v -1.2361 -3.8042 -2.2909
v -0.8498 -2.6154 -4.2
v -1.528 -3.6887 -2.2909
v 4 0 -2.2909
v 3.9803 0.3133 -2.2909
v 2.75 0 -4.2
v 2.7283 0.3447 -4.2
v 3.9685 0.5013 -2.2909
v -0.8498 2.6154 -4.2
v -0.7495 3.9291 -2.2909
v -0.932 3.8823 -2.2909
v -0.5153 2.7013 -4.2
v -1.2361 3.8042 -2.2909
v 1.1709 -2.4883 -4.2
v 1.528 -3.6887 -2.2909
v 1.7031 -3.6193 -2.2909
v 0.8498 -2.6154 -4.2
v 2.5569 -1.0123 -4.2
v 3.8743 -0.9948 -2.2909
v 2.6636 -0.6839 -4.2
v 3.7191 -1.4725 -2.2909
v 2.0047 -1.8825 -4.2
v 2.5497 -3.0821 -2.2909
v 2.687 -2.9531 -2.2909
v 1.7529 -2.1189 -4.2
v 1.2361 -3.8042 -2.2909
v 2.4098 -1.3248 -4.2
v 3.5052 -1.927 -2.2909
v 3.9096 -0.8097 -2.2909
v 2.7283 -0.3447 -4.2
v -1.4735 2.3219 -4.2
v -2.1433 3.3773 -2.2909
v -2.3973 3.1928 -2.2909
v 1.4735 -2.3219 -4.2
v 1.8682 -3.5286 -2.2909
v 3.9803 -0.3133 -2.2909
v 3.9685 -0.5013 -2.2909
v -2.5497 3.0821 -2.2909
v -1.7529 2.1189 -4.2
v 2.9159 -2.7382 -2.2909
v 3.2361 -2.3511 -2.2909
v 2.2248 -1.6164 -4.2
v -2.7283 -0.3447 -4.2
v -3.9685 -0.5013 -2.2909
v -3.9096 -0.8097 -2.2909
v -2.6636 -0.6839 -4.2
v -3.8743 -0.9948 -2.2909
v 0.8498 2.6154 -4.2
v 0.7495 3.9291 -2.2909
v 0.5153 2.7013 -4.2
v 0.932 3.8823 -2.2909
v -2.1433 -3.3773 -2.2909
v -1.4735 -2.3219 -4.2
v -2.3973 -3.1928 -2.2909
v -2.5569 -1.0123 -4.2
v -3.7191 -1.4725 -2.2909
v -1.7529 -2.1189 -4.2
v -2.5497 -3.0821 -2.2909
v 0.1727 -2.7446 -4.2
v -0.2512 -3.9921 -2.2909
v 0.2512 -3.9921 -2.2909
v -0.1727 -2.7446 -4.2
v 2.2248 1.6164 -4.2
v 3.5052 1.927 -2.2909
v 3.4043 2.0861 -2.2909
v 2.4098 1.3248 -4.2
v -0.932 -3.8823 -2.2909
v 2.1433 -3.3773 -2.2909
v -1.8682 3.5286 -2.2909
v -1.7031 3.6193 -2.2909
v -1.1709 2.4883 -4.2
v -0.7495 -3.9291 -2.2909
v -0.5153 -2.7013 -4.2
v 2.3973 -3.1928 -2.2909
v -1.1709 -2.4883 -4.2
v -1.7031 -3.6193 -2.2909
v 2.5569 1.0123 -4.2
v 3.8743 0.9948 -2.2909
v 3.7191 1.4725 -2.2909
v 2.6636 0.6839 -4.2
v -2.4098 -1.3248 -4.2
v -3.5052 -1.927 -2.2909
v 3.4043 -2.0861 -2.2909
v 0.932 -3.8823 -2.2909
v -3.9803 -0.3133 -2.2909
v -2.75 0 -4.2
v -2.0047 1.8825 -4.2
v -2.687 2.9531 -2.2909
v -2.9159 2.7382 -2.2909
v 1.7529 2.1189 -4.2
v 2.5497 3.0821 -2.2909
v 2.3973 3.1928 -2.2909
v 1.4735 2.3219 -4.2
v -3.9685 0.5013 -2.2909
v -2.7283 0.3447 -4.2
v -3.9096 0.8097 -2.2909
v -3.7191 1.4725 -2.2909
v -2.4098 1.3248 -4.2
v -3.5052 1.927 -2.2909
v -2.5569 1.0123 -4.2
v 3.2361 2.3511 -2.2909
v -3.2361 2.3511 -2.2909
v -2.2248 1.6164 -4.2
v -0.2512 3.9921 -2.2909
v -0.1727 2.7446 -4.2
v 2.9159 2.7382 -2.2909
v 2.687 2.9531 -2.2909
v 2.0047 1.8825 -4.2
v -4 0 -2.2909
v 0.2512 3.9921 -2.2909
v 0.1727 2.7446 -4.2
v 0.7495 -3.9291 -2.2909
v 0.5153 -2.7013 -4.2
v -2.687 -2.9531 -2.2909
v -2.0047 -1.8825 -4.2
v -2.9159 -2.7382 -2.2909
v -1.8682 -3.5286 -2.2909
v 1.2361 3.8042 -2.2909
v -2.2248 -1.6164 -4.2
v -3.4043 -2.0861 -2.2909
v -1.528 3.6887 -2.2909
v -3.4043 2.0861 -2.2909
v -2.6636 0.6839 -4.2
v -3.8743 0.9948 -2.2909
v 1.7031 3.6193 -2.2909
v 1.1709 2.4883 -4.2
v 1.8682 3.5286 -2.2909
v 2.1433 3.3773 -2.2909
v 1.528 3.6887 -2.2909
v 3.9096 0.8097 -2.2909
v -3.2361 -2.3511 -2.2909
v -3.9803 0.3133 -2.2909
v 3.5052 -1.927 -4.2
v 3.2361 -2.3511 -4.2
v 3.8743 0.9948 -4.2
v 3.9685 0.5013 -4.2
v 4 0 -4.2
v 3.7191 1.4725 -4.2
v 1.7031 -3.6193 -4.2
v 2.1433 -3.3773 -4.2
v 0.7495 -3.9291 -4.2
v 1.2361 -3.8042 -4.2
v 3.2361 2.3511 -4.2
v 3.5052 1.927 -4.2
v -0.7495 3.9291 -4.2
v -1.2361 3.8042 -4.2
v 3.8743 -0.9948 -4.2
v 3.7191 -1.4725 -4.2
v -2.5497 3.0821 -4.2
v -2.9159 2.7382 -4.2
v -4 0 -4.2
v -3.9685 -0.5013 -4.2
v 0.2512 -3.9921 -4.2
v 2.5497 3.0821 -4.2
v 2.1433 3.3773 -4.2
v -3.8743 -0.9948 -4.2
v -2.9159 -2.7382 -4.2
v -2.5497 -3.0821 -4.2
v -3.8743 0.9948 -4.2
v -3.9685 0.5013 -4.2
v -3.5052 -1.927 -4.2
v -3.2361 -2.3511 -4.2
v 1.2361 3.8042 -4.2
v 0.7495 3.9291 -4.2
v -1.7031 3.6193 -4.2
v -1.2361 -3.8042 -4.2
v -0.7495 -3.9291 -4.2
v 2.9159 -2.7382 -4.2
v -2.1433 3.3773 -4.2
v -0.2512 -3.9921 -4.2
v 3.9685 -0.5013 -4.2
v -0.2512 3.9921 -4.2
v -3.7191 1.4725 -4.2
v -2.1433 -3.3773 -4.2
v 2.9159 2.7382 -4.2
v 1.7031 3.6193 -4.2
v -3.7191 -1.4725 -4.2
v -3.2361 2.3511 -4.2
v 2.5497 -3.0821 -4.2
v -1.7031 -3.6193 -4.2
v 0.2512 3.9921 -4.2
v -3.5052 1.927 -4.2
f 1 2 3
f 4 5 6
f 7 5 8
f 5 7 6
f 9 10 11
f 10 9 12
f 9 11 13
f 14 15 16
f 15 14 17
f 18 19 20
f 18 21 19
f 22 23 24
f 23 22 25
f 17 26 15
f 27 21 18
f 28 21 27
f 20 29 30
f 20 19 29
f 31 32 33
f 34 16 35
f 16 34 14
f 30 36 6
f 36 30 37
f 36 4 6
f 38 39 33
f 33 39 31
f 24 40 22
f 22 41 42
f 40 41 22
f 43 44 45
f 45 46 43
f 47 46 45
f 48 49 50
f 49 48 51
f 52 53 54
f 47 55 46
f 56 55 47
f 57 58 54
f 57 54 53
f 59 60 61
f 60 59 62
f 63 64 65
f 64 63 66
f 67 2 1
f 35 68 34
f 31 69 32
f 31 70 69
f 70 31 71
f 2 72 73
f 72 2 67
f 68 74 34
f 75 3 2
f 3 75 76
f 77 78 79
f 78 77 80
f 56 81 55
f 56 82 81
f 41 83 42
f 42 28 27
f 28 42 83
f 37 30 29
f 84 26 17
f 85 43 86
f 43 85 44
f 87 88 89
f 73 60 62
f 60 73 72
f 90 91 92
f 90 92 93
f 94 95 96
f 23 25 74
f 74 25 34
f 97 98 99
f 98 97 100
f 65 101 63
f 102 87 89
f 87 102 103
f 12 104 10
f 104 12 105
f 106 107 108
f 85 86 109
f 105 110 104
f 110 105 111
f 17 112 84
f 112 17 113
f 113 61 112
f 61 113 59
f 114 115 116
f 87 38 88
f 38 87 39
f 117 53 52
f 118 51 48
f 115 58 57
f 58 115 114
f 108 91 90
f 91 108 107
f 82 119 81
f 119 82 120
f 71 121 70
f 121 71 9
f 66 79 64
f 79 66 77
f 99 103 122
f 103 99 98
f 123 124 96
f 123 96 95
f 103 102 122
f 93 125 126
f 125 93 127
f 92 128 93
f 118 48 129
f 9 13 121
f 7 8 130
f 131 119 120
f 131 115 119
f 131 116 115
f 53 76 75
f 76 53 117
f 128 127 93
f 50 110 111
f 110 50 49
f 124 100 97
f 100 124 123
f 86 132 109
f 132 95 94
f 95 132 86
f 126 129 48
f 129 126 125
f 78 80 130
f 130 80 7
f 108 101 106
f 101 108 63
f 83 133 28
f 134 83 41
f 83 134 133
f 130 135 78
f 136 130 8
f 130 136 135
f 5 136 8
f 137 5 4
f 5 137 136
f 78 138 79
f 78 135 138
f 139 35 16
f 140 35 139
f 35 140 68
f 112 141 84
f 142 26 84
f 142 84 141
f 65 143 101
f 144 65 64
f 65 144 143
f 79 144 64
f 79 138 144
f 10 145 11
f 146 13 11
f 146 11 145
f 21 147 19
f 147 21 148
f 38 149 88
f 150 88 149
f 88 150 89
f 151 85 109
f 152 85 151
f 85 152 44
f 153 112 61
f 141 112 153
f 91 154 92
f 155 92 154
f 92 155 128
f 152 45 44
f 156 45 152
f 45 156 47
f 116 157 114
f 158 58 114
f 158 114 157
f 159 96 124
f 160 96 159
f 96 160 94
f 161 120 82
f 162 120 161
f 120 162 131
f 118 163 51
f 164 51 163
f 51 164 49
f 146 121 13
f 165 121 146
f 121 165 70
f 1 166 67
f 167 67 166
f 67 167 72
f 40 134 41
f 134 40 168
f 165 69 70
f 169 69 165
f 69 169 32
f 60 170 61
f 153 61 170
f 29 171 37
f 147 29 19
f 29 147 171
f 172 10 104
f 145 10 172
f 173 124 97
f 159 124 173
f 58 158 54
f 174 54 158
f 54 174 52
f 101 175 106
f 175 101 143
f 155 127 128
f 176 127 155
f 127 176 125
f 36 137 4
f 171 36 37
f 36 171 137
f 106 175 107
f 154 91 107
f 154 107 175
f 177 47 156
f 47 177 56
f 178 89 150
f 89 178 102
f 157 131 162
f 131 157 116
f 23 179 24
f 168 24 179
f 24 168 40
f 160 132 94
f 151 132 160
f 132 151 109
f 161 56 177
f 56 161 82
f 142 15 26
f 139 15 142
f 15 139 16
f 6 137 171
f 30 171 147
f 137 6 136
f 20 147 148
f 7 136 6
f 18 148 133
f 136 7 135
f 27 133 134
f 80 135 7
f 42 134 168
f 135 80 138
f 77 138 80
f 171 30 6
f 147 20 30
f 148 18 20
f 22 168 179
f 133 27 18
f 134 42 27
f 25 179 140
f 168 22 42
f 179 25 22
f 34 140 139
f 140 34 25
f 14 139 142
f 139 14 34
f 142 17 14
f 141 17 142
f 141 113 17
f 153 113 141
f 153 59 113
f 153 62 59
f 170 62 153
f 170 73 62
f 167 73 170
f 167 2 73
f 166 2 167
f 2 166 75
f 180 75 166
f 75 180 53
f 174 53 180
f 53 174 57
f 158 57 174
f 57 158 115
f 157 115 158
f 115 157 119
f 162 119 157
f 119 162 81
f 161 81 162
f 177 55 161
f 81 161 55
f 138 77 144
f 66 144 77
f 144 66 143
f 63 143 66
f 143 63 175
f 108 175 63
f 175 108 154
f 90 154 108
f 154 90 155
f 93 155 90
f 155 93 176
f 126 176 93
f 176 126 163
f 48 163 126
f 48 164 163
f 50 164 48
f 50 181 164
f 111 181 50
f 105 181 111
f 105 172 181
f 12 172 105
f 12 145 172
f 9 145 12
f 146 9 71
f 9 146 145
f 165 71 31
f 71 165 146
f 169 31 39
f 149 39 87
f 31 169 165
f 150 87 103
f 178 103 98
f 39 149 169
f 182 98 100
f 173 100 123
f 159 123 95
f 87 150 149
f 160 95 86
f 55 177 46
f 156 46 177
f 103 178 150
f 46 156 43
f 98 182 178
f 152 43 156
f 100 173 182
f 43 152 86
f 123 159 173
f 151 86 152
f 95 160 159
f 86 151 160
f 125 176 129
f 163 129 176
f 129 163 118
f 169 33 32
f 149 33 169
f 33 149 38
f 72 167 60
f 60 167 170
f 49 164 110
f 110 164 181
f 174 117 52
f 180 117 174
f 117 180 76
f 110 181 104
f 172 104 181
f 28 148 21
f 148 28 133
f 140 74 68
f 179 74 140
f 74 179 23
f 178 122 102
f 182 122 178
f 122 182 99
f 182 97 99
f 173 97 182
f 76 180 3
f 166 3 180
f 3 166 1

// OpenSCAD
$fn = 50;

difference() {
	union() {
		translate(v = [0, 0, -4.2]) {
			cylinder(h = 7.2, r = 4.0);
		}
	}
	union() {
		translate(v = [0, 0, 0]) {
			rotate(a = [0, 0, 0]) {
				difference() {
					union() {
						translate(v = [0, 0, -7.2]) {
							cylinder(h = 7.2, r = 2.25);
						}
						translate(v = [0, 0, -4.2]) {
							cylinder(h = 4.2, r1 = 2.75, r2 = 5.5);
						}
						translate(v = [0, 0, -7.2]) {
							cylinder(h = 7.2, r = 2.75);
						}
						translate(v = [0, 0, -7.2]) {
							cylinder(h = 7.2, r = 2.25);
						}
					}
					union();
				}
			}
		}
		#cylinder(h = 3, r = 6.25);
	}
}
